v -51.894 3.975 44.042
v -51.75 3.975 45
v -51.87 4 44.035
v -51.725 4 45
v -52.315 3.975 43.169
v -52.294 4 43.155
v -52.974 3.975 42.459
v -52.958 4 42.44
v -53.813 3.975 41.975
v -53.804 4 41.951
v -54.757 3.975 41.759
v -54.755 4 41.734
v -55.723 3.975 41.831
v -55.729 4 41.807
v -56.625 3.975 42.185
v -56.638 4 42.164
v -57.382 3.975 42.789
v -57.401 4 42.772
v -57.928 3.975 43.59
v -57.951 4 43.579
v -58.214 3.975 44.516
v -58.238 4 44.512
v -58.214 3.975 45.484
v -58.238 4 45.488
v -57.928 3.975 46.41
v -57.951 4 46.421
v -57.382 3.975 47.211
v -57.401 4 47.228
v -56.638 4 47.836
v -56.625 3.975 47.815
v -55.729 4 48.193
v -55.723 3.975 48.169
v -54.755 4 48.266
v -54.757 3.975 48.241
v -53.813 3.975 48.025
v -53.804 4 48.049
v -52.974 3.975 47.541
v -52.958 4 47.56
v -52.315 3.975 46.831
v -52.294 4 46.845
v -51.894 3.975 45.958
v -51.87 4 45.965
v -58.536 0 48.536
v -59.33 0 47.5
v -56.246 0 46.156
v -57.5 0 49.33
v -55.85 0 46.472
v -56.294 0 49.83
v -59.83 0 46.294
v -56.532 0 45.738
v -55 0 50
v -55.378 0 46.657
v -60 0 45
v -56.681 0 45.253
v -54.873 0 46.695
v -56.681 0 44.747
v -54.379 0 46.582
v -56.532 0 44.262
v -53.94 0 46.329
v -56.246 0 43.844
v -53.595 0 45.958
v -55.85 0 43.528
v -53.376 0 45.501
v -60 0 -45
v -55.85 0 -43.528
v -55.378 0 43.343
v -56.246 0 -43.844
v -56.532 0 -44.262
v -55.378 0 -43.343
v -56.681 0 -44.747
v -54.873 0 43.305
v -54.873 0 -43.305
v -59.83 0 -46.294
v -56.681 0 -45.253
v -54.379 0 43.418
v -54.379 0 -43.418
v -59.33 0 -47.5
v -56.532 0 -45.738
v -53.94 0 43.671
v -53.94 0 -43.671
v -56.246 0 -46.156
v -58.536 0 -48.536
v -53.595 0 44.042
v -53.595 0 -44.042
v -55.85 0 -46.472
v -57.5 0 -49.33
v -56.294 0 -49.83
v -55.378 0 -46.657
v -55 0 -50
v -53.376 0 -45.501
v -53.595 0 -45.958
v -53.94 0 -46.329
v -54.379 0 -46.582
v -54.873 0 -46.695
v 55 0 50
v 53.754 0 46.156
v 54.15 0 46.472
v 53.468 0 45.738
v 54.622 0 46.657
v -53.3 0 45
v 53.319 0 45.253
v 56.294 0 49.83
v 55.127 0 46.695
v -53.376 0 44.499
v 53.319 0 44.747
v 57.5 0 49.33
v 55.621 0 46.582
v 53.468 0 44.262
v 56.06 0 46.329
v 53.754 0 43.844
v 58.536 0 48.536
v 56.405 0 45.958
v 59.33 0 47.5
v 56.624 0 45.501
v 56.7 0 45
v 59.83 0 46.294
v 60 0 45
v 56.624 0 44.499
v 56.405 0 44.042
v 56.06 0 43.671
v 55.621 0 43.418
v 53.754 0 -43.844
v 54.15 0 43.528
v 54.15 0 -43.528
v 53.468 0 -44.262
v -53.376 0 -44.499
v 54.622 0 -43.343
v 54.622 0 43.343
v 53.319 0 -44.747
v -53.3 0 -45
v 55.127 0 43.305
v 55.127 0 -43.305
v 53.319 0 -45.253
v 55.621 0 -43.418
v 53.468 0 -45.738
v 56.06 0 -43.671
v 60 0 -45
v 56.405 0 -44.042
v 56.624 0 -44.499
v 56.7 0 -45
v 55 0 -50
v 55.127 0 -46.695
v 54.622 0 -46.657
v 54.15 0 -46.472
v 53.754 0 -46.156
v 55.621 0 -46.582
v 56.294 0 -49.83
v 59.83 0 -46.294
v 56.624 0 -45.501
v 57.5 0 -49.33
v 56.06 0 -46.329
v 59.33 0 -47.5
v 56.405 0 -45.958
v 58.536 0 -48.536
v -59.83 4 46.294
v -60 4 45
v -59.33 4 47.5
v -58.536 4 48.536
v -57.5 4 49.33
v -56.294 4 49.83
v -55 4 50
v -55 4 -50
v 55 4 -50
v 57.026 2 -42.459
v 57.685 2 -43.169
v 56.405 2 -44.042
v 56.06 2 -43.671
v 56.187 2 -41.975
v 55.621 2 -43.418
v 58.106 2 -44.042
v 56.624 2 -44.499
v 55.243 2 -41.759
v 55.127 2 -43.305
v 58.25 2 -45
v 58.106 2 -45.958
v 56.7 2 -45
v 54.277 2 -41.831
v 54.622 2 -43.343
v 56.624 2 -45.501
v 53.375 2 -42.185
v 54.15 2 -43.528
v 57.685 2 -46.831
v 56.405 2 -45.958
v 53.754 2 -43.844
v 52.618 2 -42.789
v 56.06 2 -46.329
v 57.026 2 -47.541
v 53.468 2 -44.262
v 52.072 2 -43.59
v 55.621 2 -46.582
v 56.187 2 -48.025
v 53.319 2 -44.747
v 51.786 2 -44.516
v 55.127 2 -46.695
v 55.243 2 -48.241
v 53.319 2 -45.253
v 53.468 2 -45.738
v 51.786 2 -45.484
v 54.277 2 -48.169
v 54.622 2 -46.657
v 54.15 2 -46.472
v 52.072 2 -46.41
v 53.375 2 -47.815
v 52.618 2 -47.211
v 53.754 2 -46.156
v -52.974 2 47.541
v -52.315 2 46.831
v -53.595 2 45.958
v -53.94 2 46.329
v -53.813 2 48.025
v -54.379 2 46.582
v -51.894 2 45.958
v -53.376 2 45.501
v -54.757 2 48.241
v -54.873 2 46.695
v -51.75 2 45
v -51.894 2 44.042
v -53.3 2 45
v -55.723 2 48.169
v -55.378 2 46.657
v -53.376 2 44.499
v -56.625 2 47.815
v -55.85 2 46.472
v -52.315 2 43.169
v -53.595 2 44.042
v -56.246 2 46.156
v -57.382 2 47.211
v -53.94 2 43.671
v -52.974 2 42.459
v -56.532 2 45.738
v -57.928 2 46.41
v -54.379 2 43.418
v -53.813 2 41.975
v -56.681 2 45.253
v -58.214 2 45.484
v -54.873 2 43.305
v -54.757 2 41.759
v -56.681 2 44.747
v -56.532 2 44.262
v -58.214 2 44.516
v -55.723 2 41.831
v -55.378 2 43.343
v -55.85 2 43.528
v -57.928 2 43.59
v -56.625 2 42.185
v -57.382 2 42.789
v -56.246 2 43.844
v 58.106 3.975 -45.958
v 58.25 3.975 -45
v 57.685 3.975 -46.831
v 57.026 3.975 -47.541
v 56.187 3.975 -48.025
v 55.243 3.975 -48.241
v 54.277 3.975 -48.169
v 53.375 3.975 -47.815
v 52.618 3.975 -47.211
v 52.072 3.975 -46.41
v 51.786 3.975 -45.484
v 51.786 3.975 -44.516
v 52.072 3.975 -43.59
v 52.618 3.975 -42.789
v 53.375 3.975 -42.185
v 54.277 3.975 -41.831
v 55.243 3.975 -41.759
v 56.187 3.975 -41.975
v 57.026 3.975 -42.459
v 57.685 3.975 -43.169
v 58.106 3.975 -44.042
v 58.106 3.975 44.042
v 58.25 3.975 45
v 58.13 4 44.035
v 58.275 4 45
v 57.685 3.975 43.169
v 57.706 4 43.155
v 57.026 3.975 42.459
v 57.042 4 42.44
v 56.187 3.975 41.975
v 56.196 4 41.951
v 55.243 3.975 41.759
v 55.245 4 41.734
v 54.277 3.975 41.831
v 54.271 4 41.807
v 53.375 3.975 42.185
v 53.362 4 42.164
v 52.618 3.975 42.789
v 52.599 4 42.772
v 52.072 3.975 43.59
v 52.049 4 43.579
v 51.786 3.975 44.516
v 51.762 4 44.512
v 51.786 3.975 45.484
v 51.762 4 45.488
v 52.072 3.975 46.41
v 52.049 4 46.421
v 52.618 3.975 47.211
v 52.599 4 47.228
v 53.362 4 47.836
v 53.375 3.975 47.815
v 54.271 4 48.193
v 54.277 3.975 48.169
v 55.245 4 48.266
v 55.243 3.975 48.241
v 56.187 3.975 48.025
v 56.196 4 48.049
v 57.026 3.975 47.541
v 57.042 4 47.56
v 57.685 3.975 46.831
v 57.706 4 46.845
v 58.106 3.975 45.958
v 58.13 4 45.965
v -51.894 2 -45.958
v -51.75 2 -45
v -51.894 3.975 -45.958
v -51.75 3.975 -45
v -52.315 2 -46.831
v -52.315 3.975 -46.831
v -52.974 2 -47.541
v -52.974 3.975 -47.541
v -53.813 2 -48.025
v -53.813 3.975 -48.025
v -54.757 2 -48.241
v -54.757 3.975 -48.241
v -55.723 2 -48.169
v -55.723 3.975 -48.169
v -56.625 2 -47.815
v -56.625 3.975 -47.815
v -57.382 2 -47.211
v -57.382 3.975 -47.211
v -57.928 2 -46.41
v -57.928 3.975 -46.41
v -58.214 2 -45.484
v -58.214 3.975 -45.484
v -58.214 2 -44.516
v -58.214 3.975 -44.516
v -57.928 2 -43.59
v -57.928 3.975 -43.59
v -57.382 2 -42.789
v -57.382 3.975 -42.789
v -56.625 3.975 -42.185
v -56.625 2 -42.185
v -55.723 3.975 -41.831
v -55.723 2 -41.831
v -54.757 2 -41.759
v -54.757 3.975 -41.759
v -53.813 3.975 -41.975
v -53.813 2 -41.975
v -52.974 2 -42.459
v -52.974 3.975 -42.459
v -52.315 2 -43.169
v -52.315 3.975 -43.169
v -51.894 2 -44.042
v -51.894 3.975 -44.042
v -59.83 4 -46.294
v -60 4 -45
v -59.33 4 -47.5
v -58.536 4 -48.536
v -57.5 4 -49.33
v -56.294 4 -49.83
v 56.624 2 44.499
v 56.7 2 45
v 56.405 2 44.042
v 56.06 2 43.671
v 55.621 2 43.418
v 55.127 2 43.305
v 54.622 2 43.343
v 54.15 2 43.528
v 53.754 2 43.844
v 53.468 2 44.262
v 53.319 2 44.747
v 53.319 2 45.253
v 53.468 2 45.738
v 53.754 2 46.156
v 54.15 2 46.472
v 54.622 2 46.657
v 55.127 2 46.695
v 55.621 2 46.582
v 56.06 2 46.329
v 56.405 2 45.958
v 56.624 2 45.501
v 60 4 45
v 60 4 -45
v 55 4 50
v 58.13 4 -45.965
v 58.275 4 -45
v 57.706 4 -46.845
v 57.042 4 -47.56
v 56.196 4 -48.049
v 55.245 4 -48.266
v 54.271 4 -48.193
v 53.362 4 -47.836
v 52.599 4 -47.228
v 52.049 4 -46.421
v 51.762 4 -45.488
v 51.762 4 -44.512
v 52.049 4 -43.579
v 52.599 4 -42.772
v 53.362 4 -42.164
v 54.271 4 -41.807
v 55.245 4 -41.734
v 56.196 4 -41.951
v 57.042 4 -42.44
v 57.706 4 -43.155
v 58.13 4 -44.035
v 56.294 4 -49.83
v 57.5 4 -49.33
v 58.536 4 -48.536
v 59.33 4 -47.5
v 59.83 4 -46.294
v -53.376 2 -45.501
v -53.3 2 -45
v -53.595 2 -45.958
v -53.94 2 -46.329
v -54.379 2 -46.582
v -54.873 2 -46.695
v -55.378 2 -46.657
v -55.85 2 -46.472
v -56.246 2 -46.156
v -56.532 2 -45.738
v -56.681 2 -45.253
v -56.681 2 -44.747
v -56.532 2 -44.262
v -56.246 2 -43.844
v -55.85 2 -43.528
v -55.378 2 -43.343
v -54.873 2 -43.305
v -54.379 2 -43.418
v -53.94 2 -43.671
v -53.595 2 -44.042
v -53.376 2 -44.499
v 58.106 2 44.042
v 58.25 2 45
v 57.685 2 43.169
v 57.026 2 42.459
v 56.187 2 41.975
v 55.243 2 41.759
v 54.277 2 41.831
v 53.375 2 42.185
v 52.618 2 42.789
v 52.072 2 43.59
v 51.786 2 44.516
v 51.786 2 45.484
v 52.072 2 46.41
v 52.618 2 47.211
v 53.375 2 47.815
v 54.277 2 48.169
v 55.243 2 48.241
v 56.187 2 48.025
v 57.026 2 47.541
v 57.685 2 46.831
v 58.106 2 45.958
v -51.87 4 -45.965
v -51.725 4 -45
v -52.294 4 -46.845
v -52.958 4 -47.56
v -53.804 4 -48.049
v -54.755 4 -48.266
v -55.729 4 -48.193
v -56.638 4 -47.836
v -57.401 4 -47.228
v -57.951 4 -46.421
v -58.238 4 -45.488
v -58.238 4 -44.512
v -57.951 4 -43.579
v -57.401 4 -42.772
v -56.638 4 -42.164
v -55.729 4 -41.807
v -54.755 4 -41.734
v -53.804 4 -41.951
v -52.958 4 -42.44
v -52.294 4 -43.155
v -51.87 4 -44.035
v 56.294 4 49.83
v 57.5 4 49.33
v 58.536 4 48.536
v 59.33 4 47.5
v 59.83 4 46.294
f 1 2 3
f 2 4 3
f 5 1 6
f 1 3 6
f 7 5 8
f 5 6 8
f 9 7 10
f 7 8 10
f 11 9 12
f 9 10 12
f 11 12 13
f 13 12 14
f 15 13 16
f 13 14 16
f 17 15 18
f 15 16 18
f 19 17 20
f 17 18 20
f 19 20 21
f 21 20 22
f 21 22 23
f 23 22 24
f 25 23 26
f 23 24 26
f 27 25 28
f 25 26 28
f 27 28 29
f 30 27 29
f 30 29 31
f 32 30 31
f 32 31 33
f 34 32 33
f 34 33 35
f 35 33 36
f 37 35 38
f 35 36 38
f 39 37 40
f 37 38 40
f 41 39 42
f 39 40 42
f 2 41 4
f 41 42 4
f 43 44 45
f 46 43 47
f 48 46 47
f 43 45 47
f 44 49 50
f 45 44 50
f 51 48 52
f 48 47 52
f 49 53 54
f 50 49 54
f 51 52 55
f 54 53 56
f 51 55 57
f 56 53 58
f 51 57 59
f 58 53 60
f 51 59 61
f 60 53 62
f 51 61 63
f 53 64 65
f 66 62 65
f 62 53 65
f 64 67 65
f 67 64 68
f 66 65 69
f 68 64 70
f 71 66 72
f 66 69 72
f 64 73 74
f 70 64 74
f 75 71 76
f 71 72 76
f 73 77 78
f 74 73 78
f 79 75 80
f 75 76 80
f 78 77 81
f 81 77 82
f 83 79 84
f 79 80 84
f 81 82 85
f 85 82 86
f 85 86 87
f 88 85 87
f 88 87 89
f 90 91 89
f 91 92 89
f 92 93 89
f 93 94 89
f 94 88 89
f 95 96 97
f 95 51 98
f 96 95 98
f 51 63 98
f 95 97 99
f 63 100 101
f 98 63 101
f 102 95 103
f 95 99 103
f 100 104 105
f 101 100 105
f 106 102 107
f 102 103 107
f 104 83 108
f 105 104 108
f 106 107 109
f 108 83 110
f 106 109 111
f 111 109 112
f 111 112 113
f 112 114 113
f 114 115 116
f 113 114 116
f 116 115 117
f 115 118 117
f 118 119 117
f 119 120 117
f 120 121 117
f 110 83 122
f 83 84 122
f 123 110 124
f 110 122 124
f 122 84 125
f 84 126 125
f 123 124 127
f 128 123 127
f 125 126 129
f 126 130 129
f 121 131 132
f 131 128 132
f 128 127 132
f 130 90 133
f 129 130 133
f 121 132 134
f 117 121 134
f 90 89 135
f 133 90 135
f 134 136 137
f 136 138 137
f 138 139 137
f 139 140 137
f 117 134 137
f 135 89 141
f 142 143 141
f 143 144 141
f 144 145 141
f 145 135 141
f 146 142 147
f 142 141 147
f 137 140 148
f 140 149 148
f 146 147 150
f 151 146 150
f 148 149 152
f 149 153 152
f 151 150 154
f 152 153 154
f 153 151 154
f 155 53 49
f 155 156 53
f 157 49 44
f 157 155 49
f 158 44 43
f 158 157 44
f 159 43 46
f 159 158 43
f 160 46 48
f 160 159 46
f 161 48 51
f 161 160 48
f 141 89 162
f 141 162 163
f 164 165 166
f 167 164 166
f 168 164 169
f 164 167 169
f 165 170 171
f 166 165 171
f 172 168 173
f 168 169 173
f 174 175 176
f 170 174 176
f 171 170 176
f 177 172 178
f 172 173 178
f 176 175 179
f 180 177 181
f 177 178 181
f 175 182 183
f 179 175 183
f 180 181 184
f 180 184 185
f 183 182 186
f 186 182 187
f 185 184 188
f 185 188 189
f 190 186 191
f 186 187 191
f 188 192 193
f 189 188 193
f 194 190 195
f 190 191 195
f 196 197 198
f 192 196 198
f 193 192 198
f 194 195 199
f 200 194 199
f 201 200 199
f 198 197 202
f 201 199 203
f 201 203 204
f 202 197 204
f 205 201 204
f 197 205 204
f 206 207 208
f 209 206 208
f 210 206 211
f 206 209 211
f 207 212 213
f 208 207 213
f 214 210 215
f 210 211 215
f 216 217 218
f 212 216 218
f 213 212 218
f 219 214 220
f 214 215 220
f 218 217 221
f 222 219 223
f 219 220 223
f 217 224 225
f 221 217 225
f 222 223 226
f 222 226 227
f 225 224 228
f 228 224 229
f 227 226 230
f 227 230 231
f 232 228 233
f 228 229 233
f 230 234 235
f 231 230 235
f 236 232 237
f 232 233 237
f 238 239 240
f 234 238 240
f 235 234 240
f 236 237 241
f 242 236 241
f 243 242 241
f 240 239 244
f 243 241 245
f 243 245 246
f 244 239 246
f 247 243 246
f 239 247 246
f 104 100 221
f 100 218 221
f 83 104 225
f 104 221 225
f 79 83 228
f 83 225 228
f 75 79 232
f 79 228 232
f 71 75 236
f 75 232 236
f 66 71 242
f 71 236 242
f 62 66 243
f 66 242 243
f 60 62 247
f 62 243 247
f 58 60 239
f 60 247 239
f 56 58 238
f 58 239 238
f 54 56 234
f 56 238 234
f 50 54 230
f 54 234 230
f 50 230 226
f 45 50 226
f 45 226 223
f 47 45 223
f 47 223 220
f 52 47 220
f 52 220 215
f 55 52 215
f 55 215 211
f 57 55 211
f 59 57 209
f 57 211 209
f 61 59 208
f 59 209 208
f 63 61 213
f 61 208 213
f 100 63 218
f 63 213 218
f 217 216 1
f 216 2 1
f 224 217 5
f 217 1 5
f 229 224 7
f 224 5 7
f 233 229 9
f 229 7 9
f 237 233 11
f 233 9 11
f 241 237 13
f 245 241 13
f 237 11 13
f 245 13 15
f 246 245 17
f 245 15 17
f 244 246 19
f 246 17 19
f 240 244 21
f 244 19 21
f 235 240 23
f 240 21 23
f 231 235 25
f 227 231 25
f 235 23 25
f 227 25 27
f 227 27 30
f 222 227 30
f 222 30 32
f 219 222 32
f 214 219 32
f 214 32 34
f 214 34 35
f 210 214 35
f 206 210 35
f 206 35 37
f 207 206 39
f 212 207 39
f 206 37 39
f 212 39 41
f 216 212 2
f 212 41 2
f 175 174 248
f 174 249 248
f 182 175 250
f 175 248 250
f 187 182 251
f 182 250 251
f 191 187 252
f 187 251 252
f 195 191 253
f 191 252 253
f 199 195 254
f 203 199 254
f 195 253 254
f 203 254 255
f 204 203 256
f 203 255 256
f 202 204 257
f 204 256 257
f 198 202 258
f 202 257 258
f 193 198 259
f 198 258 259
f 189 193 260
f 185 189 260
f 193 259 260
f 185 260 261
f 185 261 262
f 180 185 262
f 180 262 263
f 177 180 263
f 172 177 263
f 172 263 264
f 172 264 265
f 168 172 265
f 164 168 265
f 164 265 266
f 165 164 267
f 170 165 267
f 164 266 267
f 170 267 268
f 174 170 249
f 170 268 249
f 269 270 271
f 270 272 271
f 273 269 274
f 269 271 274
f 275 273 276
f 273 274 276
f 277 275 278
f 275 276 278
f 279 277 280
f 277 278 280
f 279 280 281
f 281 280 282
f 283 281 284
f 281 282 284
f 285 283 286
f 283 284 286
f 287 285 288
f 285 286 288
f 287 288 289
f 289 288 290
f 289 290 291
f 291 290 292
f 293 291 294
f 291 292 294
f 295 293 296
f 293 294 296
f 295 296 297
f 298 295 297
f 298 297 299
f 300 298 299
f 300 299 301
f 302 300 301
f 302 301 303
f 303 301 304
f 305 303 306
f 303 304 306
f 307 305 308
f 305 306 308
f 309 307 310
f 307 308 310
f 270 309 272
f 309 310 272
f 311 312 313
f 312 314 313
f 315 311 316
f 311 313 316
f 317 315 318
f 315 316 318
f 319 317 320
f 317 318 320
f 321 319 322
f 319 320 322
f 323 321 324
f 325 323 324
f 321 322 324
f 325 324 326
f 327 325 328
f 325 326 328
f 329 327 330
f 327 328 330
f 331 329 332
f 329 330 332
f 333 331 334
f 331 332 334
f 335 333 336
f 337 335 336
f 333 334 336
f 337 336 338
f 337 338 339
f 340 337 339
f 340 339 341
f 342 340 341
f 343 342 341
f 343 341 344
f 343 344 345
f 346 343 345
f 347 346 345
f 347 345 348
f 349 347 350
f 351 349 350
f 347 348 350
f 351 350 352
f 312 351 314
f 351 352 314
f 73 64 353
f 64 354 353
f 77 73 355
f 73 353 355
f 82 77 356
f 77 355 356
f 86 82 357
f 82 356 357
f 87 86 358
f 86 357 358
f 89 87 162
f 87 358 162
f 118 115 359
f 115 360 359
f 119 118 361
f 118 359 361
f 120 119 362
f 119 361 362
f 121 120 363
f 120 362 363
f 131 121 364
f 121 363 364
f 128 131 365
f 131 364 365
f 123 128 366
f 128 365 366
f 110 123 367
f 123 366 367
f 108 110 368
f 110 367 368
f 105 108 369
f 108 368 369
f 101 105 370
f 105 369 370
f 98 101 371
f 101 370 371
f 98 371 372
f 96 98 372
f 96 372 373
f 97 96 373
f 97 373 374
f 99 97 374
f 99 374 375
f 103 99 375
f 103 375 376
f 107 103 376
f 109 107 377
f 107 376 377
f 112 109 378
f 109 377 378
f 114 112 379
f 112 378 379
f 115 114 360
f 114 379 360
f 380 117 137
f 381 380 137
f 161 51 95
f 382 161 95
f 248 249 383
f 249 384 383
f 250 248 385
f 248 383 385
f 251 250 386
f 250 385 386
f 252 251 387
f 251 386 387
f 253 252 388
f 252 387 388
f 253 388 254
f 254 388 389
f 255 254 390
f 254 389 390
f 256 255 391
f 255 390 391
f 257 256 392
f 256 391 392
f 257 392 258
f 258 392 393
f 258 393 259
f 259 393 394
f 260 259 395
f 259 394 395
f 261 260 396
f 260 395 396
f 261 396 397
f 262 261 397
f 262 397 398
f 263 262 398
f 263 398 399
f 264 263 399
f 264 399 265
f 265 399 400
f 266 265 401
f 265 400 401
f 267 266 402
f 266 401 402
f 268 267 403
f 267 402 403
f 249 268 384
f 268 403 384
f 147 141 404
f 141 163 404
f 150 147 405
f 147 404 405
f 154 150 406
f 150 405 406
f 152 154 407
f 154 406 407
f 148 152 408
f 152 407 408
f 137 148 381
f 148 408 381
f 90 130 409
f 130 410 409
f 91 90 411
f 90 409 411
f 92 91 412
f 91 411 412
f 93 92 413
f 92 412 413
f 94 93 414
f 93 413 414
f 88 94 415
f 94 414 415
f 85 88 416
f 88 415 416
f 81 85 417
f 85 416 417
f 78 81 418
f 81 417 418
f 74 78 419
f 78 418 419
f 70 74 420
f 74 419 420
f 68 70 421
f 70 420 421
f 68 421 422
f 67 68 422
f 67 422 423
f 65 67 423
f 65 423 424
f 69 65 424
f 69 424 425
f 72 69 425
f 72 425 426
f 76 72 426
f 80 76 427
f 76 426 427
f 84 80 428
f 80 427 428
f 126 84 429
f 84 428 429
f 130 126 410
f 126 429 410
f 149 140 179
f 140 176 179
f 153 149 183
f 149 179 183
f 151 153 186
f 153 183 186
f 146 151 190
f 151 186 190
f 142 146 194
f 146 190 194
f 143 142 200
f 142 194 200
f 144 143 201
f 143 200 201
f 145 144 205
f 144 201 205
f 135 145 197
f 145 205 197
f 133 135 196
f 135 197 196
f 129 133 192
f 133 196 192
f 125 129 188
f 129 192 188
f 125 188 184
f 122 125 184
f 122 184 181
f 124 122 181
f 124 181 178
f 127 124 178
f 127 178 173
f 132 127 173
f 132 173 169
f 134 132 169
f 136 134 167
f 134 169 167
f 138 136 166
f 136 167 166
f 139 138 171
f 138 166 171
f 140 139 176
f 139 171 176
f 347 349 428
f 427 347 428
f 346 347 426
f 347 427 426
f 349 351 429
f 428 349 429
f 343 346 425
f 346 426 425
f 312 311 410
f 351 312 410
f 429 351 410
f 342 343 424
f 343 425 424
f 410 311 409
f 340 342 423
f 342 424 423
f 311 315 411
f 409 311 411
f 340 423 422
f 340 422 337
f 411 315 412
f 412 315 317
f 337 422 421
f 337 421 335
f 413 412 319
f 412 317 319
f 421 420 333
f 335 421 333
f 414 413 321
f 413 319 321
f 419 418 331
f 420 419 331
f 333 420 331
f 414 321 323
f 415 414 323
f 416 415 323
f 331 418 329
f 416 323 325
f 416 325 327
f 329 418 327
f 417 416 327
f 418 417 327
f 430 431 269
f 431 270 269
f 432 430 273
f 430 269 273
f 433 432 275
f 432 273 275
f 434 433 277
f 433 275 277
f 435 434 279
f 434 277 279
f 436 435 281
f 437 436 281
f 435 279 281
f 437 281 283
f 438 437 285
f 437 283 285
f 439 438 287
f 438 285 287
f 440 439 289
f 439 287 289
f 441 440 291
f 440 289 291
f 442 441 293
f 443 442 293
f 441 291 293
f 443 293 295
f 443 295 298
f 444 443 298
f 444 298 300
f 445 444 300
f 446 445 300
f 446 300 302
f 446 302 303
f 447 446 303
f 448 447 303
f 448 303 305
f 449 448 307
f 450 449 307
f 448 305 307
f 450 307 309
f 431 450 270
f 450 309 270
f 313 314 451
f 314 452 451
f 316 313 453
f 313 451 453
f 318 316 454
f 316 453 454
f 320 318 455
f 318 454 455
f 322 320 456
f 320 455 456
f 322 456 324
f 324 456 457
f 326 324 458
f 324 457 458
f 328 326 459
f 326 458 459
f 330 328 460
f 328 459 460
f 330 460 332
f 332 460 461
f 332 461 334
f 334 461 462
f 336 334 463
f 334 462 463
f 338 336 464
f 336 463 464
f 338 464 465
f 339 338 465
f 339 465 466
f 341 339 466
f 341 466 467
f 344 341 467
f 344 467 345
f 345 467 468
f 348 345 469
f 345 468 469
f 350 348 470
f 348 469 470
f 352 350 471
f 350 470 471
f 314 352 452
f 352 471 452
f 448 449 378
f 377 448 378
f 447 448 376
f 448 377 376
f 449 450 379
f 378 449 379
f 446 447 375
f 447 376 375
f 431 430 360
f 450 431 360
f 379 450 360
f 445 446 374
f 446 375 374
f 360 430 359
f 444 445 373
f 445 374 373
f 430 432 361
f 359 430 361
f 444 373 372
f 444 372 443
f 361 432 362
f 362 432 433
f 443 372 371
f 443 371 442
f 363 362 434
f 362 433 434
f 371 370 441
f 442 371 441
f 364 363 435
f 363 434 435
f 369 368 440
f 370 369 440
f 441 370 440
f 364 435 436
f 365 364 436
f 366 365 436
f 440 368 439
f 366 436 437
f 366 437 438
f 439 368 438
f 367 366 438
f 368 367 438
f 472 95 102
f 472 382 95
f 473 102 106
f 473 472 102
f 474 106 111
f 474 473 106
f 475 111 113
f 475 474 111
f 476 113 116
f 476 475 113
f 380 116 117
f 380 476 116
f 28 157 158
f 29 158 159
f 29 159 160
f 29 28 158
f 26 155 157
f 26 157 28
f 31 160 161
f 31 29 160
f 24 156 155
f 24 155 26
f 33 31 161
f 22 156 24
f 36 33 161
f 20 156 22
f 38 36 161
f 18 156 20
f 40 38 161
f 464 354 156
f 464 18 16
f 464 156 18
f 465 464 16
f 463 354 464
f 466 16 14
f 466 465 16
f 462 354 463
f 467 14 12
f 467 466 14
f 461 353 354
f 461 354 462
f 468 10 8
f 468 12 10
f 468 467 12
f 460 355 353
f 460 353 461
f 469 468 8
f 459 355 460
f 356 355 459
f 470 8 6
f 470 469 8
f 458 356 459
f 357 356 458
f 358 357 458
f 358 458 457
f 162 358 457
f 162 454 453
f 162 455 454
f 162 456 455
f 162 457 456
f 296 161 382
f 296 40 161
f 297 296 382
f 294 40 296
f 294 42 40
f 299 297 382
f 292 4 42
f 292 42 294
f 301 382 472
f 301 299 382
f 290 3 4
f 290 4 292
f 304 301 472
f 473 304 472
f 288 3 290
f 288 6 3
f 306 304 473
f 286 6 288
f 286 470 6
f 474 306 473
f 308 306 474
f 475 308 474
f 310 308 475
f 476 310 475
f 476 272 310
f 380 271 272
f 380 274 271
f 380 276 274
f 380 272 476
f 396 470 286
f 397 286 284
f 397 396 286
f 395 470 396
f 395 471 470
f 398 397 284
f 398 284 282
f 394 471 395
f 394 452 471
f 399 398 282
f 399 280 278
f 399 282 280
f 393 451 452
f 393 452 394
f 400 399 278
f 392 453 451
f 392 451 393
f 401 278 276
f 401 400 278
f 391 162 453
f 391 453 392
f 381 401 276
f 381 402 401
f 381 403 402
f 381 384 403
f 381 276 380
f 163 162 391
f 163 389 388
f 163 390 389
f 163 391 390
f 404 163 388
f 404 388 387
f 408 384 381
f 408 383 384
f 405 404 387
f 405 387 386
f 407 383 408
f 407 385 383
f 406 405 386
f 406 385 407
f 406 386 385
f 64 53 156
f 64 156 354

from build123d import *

# Parameters (mm, degrees)
SKETCH1_W      = 120
SKETCH1_H      = 100
BODY_DEPTH     = 4
EDGE_FILLETS_R = 5


# Read off the part's stored shape, not the designer's step: mounting_holes
with BuildPart() as part:
    # Sketch1 → body (new body)
    with BuildSketch(Plane(origin=(0, 0, 0), x_dir=(1, 0, 0), z_dir=(0, 1, 0))):
        Rectangle(SKETCH1_W, SKETCH1_H)
    extrude(amount=BODY_DEPTH)

    # mounting_holes outline → mounting_holes (revolve, cut)
    with BuildSketch(Plane(origin=(55, 0, 45), x_dir=(1, 0, 0), z_dir=(0, 0, 1))):
        Polygon((0, 0), (1.7, 0), (1.7, 2), (3.25, 2), (3.25, 3.975), (3.275, 4), (0, 4), align=None)
    revolve(axis=Axis((55, 0, 45), (0, 1, 0)), mode=Mode.SUBTRACT)

    # mounting_holes 2 outline → mounting_holes 2 (revolve, cut)
    with BuildSketch(Plane(origin=(-55, 0, -45), x_dir=(1, 0, 0), z_dir=(0, 0, 1))):
        Polygon((0, 4), (0, 0), (1.7, 0), (1.7, 2), (3.25, 2), (3.25, 3.975), (3.275, 4), align=None)
    revolve(axis=Axis((-55, 0, -45), (0, 1, 0)), mode=Mode.SUBTRACT)

    # mounting_holes 3 outline → mounting_holes 3 (revolve, cut)
    with BuildSketch(Plane(origin=(55, 0, -45), x_dir=(1, 0, 0), z_dir=(0, 0, 1))):
        Polygon((0, 4), (0, 0), (1.7, 0), (1.7, 2), (3.25, 2), (3.25, 3.975), (3.275, 4), align=None)
    revolve(axis=Axis((55, 0, -45), (0, 1, 0)), mode=Mode.SUBTRACT)

    # mounting_holes 4 outline → mounting_holes 4 (revolve, cut)
    with BuildSketch(Plane(origin=(-55, 0, 45), x_dir=(1, 0, 0), z_dir=(0, 0, 1))):
        Polygon((0, 4), (0, 0), (1.7, 0), (1.7, 2), (3.25, 2), (3.25, 3.975), (3.275, 4), align=None)
    revolve(axis=Axis((-55, 0, 45), (0, 1, 0)), mode=Mode.SUBTRACT)

    # edge_fillets
    edge_fillets_edges = [part.edges().sort_by_distance(p)[0] for p in [
        (60, 2, 50),
        (-60, 2, 50),
        (-60, 2, -50),
        (60, 2, -50),
    ]]
    fillet(edge_fillets_edges, radius=EDGE_FILLETS_R)


solid = part.part
